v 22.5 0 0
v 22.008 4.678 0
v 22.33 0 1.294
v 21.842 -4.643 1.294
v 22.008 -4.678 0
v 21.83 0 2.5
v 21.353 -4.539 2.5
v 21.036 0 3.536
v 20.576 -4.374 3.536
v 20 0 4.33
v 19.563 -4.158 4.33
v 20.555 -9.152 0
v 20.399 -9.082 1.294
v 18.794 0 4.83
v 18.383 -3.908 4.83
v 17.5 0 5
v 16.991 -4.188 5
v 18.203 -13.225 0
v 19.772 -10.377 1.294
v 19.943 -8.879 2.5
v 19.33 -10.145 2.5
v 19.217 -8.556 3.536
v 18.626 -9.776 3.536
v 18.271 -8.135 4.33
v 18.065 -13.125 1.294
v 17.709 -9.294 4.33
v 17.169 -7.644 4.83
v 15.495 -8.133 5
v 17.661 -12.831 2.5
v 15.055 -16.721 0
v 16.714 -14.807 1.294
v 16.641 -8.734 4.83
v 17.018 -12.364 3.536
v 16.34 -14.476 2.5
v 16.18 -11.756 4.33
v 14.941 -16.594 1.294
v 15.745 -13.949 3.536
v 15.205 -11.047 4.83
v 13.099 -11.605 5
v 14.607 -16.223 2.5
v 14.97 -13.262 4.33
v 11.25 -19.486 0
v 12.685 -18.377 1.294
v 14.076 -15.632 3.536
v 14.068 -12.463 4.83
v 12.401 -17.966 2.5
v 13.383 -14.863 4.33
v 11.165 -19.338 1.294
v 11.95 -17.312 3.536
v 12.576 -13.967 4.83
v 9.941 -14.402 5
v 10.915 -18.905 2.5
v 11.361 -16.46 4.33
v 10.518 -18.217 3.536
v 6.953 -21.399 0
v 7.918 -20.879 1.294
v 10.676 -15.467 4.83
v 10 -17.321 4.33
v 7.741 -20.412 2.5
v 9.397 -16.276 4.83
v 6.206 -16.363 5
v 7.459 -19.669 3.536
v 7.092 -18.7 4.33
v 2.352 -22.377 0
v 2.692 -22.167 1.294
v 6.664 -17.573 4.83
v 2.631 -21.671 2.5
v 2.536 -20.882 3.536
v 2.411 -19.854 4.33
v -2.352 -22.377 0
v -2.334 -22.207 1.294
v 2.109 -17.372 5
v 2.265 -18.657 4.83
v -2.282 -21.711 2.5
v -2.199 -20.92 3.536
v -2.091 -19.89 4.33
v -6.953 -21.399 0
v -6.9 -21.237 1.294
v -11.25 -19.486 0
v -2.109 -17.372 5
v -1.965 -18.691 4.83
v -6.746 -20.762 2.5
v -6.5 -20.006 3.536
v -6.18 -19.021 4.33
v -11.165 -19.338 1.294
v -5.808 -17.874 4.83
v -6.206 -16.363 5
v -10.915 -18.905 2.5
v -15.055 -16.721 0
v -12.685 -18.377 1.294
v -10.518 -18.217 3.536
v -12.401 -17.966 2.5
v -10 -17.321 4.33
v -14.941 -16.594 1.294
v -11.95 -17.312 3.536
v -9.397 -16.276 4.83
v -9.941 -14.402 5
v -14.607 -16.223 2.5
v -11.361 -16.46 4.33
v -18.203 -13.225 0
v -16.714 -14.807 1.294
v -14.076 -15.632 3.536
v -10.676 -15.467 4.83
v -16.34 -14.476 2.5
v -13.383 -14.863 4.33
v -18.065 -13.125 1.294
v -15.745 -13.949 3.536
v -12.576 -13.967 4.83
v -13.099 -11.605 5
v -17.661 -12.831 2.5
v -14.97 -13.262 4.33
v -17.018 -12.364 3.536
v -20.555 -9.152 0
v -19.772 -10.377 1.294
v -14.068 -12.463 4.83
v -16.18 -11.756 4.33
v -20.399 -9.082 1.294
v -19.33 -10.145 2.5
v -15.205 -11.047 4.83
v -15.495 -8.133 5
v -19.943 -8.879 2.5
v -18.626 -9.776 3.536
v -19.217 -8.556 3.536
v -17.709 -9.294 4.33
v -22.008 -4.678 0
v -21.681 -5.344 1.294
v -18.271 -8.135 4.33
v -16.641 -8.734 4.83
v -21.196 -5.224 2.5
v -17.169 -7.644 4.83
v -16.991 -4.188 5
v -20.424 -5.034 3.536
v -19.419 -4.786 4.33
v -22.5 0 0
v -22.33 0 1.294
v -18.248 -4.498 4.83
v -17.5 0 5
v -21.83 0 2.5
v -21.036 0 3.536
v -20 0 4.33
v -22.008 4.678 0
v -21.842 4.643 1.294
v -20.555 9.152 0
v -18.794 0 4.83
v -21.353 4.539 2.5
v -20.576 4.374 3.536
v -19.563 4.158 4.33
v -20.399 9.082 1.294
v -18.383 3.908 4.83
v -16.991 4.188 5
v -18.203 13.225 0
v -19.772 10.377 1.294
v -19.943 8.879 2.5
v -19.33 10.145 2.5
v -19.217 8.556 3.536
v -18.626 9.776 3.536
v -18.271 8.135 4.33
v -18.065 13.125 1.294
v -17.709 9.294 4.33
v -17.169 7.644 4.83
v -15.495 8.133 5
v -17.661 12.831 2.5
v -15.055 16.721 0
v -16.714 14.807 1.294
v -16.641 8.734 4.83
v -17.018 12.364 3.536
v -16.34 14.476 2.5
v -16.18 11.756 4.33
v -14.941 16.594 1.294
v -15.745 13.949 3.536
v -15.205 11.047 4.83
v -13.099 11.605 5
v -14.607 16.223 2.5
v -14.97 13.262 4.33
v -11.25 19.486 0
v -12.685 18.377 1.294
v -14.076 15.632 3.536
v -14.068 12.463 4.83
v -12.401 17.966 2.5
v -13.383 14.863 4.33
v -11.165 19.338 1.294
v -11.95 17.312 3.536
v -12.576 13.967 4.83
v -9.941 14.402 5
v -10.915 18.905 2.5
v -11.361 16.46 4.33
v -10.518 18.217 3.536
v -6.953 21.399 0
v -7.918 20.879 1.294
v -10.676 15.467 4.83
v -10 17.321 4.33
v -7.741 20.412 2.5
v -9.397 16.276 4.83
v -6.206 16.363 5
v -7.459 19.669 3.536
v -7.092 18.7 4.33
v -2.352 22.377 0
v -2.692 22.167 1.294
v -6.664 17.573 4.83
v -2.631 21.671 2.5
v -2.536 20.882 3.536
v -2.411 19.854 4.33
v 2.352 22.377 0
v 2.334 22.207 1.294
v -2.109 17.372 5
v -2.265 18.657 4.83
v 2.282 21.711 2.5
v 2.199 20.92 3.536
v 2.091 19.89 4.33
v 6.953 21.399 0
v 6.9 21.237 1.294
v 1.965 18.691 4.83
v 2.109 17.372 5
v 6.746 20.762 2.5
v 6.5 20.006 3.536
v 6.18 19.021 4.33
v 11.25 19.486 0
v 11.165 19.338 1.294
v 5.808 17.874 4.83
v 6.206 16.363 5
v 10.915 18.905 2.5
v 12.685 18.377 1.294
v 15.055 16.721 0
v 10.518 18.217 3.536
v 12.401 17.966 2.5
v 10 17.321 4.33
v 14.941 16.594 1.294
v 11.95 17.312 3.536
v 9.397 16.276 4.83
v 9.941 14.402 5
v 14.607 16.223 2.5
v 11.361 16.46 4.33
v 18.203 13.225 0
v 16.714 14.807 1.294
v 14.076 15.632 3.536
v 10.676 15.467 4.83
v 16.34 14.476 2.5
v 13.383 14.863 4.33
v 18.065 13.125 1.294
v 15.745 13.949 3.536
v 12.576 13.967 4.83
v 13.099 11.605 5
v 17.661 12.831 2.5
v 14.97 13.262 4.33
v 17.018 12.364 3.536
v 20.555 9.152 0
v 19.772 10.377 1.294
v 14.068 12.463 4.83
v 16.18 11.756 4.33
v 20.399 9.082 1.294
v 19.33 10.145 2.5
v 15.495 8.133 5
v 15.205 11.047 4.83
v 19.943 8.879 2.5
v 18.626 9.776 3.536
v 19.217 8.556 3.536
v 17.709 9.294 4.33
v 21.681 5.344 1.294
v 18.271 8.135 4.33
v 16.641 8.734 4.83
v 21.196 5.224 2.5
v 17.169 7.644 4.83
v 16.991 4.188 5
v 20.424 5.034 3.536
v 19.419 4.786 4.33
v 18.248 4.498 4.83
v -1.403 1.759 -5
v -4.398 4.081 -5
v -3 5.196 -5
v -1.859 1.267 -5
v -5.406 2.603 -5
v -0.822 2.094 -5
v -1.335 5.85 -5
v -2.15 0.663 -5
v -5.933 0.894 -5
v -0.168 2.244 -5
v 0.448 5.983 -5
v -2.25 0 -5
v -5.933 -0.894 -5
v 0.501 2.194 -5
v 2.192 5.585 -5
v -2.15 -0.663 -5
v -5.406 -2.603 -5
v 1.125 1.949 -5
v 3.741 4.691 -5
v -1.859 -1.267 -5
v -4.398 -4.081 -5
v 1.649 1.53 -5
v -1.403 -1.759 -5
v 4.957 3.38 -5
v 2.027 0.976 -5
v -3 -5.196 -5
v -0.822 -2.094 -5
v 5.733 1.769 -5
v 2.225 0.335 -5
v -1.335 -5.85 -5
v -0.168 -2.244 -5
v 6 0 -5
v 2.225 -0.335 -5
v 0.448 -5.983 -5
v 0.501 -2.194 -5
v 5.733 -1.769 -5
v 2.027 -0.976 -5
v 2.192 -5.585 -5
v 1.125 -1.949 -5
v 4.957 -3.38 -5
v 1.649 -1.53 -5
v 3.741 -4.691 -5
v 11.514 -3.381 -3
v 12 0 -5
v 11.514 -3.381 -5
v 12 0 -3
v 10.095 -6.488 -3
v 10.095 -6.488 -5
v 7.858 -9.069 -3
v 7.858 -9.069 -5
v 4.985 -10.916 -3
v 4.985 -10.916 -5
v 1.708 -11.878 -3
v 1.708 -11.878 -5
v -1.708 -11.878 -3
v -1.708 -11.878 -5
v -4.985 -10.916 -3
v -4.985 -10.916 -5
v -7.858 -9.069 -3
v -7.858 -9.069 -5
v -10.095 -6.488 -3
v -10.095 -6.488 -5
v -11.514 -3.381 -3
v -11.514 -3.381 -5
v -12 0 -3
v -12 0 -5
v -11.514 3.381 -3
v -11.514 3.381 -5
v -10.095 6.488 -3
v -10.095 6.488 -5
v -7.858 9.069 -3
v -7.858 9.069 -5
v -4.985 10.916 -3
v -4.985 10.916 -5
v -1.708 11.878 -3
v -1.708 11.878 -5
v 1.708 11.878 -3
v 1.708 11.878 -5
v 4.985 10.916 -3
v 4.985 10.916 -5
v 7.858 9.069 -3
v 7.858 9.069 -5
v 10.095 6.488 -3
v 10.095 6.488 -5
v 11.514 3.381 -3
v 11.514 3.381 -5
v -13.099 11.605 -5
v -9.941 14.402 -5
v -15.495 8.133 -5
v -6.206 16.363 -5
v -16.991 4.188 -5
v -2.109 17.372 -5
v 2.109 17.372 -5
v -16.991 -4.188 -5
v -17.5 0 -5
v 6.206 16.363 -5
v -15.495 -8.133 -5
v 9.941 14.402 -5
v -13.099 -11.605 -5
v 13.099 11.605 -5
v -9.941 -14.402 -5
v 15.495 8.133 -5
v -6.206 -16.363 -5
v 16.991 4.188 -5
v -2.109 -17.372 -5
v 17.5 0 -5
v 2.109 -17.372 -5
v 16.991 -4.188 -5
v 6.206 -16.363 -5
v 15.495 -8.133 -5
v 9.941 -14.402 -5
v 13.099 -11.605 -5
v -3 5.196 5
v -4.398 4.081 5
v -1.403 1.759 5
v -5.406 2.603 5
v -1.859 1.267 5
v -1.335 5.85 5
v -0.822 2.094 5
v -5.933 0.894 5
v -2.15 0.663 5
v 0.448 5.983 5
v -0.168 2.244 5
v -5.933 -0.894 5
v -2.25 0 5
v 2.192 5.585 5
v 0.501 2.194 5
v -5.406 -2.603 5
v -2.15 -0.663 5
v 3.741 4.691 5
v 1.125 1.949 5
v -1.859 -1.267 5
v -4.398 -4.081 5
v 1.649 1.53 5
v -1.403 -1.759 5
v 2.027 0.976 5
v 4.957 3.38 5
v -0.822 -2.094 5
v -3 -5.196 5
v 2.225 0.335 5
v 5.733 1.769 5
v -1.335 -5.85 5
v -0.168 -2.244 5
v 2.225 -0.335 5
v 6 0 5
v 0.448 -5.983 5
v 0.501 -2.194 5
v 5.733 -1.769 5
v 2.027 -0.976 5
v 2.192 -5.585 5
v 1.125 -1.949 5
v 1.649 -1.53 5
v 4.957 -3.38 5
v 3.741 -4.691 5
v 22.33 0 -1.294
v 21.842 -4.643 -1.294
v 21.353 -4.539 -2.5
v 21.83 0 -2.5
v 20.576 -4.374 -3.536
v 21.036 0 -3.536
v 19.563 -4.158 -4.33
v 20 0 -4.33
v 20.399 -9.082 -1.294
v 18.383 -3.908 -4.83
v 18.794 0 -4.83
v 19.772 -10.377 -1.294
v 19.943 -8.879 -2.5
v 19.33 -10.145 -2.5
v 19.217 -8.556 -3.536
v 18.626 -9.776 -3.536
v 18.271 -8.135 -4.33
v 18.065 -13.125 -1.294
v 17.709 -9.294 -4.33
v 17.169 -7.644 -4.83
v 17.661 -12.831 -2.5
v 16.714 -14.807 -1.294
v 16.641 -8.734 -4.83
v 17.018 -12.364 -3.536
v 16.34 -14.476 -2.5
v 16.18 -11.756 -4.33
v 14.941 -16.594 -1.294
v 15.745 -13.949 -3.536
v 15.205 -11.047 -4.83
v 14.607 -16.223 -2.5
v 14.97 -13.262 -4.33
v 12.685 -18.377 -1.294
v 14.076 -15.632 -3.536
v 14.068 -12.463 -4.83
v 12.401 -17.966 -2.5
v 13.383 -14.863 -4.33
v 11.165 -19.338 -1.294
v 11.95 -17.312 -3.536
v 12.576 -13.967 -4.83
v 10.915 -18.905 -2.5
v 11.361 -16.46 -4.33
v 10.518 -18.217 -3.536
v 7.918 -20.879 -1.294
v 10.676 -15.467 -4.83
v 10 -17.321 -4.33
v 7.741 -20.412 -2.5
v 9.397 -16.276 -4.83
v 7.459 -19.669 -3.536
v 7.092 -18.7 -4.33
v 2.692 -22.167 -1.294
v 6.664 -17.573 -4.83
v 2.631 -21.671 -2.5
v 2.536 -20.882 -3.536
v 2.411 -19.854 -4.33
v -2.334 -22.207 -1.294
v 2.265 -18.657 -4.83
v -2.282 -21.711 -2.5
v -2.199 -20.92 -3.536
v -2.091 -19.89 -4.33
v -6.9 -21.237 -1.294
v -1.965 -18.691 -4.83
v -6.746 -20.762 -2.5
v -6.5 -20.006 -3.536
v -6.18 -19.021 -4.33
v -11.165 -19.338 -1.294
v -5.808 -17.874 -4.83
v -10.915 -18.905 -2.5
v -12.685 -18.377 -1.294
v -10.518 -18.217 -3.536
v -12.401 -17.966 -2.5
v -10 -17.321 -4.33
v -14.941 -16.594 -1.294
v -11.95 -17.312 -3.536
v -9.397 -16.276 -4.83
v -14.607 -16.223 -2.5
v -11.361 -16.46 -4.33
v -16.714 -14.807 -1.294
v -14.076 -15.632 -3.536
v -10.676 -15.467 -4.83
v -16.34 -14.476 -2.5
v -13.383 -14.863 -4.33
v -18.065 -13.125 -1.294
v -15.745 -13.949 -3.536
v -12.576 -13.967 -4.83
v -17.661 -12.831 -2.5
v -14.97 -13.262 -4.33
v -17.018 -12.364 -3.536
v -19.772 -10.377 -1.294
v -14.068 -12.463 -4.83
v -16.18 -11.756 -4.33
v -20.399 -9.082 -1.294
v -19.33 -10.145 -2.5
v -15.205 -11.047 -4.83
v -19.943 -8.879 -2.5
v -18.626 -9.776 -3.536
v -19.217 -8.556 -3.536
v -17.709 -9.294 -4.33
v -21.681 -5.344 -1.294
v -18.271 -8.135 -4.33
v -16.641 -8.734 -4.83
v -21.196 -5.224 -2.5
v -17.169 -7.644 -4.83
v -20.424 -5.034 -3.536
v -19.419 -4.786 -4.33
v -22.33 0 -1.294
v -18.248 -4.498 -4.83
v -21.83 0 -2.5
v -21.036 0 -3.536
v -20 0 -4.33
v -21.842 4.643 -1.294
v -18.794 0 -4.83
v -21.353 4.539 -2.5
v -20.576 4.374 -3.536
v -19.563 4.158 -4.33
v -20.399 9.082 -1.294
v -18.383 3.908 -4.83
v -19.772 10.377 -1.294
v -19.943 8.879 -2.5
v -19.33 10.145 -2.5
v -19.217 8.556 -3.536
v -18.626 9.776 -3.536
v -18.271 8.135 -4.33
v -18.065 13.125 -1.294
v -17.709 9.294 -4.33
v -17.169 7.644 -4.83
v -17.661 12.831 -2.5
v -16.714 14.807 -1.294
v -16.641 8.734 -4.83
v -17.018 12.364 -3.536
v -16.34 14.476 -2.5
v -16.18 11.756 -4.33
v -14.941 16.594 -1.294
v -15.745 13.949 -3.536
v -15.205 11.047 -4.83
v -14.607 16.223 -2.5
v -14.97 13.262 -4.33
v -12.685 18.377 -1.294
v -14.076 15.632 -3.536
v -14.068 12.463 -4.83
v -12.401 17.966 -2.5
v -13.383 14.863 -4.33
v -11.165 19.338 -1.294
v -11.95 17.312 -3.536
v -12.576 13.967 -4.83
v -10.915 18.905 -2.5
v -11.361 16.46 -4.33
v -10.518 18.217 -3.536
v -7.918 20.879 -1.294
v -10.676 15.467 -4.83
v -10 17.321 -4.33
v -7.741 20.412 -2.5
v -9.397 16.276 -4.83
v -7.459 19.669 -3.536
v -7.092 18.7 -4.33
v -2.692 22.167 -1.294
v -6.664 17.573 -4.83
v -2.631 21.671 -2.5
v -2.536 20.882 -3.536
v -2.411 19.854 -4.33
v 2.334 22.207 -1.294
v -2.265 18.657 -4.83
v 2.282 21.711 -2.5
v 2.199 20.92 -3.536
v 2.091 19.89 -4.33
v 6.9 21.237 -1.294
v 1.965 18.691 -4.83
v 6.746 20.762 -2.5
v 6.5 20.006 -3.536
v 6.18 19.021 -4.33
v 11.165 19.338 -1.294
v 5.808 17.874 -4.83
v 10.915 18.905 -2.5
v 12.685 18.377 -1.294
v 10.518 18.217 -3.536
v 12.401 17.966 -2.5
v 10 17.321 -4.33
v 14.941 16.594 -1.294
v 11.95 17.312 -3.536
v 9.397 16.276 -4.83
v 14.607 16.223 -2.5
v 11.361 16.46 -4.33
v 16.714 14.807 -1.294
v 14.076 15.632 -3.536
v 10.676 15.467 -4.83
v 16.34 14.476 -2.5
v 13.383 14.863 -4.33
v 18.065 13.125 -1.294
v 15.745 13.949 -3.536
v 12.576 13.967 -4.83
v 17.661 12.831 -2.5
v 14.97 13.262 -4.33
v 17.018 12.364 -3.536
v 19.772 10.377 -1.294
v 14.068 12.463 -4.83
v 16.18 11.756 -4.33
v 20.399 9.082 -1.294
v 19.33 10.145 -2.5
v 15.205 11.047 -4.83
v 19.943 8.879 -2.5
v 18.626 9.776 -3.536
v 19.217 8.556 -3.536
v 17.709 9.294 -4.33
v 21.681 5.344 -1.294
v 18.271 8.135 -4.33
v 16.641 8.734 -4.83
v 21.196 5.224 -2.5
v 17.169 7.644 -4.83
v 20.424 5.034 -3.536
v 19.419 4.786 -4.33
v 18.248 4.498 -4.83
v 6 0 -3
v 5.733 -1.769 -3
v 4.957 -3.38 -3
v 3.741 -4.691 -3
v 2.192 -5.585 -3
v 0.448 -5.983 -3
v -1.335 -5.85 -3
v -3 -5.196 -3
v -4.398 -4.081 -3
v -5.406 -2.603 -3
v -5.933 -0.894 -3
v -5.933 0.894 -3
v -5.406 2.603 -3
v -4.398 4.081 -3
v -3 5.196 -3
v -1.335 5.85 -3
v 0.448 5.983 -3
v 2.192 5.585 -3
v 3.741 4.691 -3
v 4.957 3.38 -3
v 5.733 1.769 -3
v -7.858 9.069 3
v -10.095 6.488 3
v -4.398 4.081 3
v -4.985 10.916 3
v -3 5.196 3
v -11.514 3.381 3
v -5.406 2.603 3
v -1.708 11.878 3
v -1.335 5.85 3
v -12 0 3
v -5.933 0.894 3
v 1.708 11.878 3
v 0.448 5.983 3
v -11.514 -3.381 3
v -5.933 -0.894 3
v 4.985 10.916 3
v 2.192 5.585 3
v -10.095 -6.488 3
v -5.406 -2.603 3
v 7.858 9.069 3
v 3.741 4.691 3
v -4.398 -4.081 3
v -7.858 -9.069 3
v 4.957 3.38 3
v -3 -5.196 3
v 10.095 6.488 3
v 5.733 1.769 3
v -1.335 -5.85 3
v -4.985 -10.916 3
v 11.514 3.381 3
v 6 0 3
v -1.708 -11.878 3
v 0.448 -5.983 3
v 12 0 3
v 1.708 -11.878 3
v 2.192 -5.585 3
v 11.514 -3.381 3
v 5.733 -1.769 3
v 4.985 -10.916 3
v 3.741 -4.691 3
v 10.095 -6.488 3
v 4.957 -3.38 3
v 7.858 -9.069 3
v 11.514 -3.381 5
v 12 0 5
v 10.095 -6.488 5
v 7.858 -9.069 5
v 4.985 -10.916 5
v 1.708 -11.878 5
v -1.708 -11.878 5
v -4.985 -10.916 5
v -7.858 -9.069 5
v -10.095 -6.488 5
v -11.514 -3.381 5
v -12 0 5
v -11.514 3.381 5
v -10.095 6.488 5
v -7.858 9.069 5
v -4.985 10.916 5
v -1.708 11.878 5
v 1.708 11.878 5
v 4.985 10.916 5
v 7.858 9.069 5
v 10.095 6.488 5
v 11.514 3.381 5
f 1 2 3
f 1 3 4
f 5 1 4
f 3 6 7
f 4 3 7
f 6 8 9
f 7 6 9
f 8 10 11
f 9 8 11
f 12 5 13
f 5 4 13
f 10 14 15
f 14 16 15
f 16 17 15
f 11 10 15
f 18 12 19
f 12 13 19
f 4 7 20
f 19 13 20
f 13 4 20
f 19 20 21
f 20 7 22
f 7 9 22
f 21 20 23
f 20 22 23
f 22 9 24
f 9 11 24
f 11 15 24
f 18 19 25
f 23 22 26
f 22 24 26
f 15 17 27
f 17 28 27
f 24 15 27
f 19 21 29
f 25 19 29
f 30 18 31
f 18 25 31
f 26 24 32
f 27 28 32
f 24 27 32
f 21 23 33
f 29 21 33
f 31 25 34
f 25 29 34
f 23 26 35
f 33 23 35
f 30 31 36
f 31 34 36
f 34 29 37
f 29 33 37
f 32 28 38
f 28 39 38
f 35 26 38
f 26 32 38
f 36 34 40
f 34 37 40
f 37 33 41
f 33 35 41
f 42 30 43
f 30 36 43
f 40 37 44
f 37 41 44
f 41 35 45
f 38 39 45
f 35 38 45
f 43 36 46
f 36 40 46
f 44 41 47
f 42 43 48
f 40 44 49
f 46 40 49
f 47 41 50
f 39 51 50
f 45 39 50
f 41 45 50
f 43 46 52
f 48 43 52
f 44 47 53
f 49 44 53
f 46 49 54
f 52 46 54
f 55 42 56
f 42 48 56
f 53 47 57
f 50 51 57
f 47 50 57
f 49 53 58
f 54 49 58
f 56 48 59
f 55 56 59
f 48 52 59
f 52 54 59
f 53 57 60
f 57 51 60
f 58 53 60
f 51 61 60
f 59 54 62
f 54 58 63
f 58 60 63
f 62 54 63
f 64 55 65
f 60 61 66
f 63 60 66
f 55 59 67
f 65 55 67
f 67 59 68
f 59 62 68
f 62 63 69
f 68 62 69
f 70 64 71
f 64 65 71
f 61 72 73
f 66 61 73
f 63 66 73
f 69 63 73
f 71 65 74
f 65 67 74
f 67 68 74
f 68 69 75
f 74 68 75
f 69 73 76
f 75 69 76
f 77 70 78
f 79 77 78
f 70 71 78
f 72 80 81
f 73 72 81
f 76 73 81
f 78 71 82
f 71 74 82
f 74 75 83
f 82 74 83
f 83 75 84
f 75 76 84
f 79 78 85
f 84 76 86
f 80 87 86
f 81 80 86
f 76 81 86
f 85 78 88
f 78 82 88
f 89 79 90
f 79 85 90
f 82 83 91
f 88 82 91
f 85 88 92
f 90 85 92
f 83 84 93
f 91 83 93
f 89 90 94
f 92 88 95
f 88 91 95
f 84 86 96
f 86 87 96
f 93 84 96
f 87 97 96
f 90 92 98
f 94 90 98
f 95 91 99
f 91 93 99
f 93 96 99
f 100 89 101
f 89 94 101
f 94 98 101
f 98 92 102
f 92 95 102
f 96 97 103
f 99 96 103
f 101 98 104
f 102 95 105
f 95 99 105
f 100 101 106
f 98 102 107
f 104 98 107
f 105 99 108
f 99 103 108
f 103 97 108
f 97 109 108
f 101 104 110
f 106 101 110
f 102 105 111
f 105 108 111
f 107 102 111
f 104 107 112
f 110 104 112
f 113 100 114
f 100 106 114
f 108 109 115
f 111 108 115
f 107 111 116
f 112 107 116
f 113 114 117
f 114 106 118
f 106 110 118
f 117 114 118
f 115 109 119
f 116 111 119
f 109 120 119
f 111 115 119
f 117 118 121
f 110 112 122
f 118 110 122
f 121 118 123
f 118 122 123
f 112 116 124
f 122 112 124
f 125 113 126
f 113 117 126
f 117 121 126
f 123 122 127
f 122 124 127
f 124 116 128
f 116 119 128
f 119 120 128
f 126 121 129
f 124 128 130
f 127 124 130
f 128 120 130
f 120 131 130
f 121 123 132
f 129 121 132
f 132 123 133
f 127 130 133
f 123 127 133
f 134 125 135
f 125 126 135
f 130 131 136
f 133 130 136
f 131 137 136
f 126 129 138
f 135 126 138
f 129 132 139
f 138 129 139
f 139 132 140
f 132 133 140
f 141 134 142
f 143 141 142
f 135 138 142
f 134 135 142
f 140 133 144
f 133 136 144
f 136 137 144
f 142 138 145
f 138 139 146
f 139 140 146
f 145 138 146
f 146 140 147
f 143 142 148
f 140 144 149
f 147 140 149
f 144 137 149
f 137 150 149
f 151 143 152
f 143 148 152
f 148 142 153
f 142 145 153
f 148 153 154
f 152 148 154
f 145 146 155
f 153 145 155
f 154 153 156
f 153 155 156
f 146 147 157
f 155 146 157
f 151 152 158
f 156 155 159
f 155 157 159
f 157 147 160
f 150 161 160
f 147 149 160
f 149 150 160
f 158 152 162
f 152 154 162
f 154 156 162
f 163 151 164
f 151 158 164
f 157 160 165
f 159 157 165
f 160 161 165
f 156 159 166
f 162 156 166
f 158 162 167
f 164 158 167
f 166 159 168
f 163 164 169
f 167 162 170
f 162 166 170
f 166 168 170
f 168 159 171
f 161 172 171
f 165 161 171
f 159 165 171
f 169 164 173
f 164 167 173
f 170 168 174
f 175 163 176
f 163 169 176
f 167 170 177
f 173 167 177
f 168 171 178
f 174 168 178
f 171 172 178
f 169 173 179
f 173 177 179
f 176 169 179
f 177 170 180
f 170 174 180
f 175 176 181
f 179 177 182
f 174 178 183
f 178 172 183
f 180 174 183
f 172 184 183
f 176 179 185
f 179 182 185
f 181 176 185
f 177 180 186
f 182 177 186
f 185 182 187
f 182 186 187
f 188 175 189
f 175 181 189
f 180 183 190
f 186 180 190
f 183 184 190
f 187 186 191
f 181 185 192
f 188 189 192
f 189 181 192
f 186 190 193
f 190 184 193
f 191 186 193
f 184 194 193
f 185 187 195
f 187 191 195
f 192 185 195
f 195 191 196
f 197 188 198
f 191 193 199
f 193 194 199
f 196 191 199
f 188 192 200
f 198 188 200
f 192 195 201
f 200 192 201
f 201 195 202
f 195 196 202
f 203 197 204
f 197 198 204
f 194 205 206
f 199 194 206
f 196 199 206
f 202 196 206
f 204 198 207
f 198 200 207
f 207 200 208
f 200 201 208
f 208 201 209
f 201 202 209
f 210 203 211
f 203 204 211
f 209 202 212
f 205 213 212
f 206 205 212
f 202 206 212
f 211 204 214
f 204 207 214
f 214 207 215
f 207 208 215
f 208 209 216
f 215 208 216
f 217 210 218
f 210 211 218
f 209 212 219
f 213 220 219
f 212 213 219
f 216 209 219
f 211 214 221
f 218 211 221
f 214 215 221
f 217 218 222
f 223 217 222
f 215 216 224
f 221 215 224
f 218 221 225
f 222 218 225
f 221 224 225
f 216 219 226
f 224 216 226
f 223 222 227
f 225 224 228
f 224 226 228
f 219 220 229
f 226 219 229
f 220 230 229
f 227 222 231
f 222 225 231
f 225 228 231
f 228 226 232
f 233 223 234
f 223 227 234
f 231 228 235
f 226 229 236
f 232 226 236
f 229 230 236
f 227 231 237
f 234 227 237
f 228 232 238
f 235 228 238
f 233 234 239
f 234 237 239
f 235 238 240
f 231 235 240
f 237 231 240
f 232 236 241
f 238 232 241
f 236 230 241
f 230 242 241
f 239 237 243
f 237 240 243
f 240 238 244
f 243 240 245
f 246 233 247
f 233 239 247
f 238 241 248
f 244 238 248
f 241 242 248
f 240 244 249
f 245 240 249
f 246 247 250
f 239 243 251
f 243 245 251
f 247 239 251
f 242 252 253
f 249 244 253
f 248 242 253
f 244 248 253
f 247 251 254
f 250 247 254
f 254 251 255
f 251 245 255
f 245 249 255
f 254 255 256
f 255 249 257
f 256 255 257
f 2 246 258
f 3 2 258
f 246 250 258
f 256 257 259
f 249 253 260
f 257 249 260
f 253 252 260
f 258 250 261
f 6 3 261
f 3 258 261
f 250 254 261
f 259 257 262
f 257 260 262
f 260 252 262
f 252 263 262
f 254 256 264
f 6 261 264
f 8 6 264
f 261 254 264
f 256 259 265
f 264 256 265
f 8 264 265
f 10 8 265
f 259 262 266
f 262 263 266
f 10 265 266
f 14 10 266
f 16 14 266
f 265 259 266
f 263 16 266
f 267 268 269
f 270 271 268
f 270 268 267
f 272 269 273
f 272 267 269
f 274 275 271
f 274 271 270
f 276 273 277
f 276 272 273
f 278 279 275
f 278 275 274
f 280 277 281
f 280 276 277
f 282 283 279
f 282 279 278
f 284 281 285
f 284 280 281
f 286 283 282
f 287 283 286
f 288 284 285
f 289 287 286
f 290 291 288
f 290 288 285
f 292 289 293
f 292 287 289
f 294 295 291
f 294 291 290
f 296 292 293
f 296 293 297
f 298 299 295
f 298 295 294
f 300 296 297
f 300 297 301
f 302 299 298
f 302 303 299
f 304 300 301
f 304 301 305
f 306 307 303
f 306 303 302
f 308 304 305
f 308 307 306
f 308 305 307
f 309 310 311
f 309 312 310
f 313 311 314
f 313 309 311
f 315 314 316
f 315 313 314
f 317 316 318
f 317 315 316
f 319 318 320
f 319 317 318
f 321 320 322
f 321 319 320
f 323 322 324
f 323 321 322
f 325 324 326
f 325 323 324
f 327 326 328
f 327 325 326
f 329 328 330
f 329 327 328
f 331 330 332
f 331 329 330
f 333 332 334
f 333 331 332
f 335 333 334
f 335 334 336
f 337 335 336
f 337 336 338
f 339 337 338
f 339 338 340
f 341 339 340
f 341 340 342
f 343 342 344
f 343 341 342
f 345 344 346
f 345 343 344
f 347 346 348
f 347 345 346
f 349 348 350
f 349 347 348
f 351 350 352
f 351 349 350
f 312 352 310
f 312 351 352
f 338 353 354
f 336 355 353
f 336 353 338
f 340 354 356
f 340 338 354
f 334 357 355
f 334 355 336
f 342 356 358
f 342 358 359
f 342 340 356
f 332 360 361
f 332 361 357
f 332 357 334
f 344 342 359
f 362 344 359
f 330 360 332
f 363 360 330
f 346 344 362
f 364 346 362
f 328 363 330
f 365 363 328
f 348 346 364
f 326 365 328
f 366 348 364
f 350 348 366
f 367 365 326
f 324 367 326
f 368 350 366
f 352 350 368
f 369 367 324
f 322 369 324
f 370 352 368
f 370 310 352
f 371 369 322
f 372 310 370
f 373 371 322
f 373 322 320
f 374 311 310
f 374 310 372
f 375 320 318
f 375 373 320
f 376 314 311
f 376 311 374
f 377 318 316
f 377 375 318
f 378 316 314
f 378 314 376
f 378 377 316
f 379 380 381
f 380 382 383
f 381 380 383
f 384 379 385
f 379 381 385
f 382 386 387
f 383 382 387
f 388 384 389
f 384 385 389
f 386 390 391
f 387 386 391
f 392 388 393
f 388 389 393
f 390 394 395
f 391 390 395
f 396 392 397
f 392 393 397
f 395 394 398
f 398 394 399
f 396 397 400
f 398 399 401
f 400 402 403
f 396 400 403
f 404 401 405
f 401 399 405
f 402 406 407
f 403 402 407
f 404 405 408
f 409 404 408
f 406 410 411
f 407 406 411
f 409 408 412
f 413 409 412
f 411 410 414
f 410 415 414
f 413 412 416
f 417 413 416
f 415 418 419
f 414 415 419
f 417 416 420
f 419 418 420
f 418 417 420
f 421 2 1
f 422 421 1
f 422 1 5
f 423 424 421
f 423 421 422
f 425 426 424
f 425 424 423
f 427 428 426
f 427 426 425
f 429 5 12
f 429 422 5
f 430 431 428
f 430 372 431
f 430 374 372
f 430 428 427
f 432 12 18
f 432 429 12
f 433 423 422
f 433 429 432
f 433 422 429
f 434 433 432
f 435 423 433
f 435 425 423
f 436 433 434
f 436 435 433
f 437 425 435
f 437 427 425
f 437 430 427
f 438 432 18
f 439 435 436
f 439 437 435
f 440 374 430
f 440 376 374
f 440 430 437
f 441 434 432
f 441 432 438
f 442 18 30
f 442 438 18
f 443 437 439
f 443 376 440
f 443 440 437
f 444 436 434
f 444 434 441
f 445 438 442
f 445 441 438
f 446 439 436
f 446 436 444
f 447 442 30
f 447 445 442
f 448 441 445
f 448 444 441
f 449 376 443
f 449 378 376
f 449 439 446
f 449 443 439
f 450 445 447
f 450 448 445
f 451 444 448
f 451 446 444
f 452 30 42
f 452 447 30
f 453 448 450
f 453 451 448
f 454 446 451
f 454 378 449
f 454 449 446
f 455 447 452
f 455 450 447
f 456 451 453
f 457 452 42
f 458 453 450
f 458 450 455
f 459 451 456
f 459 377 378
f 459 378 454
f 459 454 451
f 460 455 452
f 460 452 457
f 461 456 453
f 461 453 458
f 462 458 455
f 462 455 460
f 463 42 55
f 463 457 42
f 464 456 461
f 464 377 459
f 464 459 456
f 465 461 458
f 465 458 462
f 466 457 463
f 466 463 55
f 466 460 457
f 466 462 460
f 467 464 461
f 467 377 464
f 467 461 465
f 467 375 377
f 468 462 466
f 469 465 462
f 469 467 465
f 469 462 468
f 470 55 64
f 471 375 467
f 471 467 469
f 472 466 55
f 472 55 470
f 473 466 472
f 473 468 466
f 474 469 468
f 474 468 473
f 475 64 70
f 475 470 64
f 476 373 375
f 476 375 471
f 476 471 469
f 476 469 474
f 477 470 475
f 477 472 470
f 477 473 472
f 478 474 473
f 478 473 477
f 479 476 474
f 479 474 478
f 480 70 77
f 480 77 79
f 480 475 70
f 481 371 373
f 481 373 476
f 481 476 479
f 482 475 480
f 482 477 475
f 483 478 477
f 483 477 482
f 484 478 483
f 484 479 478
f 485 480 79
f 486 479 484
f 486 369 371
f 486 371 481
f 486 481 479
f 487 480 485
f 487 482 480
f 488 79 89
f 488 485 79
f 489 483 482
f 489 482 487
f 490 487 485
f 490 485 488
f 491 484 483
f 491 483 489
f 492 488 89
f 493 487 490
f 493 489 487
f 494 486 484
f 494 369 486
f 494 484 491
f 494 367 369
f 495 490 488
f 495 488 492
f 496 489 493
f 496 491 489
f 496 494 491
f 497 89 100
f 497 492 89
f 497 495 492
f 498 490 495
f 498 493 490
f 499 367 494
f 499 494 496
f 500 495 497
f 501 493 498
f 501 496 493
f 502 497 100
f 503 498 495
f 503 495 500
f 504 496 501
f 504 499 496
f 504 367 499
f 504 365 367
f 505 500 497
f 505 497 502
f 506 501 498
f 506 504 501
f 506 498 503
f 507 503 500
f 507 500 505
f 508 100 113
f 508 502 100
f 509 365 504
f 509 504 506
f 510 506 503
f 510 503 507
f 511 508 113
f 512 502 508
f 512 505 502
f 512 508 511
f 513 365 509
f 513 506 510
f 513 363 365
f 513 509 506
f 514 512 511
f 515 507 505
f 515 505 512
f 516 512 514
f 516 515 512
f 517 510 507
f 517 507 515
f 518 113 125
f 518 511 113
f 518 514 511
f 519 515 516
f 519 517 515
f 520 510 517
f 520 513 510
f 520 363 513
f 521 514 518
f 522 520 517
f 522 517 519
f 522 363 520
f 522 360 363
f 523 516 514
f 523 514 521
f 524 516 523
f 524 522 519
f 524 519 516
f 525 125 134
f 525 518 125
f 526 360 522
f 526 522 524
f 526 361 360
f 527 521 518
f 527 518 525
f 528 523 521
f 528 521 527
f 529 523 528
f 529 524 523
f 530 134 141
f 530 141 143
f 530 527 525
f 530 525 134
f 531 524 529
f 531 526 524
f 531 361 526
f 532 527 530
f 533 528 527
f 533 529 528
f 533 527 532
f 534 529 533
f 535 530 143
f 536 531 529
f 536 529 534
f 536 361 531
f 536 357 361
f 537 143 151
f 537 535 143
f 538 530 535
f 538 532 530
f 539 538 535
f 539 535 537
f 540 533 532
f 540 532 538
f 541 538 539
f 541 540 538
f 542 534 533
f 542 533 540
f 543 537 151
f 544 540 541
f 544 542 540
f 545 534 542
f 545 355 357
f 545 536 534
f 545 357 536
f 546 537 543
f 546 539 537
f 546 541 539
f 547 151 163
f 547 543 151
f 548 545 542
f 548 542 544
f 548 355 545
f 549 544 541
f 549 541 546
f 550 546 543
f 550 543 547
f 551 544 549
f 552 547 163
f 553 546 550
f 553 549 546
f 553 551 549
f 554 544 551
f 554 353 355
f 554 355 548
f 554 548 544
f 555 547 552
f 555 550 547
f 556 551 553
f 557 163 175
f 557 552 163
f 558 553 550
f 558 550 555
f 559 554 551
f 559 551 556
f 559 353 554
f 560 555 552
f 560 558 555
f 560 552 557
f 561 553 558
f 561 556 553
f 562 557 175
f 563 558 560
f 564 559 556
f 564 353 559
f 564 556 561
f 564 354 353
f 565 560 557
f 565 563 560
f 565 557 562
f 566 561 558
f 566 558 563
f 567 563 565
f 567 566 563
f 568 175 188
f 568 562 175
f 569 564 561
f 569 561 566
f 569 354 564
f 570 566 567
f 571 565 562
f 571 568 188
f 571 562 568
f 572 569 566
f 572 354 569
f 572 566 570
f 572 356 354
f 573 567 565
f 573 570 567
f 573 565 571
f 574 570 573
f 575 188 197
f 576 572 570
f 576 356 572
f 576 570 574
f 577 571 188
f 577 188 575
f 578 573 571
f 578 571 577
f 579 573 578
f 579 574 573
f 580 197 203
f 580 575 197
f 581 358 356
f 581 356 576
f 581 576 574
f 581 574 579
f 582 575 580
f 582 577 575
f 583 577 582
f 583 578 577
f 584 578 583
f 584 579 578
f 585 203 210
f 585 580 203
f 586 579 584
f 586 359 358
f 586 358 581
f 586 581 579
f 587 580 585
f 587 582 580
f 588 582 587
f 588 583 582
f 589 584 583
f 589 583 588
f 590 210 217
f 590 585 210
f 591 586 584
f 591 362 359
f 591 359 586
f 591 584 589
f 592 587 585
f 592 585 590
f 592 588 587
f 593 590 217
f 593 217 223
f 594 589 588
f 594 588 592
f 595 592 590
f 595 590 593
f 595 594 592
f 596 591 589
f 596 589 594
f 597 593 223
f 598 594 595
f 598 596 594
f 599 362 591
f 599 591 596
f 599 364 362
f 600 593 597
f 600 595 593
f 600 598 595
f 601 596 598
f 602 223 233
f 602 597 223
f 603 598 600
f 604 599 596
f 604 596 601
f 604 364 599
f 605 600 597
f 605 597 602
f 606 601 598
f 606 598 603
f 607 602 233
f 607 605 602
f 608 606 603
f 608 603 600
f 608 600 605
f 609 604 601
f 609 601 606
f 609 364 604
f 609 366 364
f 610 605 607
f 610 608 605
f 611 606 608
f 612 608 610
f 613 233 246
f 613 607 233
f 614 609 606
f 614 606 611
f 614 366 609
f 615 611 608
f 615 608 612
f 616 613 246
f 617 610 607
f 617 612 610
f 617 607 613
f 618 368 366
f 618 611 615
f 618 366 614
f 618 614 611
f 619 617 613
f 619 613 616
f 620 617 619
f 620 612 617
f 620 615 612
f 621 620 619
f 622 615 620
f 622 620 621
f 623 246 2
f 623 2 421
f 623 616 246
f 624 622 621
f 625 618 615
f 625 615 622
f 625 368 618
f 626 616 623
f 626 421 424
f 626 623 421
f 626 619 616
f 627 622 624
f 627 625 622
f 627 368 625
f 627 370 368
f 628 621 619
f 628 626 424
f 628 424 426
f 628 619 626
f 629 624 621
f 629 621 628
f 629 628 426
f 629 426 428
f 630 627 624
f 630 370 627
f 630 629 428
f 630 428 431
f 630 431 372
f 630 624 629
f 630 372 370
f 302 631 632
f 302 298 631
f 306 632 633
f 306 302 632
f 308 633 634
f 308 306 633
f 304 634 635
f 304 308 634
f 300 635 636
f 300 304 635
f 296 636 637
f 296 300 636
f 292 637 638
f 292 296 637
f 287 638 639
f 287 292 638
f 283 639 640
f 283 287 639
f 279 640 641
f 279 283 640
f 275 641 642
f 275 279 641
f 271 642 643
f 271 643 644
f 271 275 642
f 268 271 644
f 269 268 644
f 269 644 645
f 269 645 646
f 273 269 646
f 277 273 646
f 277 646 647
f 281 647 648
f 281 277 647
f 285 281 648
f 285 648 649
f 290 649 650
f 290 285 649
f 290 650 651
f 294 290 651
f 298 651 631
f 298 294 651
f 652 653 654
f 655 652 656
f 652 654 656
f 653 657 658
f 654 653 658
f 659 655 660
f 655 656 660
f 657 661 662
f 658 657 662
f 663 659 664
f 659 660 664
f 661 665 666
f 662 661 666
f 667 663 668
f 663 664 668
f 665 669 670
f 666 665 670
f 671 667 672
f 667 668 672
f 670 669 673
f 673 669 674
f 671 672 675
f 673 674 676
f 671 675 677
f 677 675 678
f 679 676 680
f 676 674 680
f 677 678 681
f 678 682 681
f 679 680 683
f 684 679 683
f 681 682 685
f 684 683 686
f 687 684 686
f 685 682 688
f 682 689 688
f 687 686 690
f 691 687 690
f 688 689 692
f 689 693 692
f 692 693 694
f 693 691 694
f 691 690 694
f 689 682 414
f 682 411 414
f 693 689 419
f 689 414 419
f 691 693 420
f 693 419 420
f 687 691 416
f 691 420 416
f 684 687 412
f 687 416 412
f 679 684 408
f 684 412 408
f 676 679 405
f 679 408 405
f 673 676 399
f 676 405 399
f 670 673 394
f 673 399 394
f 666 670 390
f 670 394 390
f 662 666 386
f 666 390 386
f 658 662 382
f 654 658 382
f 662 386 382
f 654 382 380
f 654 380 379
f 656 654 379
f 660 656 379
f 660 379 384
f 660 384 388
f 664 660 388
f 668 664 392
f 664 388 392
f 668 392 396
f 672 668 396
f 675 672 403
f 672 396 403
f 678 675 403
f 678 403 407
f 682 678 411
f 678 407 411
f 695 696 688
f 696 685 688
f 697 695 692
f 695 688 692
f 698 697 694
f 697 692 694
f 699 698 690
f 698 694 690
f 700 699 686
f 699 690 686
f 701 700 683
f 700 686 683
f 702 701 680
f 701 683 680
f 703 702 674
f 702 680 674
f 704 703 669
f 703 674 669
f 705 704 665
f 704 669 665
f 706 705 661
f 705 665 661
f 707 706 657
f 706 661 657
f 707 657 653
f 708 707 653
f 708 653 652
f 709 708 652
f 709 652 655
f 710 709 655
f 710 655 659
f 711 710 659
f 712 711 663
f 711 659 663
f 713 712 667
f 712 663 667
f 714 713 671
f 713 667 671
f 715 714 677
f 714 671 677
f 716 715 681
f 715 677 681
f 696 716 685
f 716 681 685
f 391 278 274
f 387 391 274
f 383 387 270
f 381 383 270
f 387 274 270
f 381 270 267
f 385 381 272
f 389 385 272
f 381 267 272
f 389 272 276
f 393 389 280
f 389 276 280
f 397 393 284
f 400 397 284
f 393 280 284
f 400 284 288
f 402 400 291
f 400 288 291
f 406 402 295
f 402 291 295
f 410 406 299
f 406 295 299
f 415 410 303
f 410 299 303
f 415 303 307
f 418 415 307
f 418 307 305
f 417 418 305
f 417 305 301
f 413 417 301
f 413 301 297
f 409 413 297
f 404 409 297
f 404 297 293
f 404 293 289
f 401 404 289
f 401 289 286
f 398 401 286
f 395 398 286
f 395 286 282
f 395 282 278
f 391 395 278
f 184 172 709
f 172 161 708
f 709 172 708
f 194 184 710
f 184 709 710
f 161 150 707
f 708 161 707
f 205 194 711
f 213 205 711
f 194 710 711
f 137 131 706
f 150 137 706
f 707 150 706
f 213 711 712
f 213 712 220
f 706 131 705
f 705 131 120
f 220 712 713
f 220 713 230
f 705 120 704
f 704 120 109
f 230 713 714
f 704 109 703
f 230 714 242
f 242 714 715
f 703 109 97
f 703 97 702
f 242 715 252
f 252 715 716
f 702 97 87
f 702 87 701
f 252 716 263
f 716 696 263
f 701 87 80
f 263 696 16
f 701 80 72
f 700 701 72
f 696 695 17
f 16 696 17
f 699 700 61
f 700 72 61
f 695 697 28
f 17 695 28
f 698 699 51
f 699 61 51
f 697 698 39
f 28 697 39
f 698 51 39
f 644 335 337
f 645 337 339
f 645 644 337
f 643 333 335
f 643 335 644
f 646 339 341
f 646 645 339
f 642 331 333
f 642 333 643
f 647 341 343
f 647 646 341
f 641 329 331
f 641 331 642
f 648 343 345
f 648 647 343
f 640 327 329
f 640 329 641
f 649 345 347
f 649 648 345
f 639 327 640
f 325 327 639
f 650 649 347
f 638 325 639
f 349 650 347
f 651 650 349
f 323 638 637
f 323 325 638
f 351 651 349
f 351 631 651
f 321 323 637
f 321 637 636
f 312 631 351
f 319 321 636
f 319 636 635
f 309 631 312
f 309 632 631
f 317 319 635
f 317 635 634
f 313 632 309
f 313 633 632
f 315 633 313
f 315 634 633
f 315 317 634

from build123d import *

# Parameters (mm, degrees)
SKETCH3_R          = 2.25
CUT_EXTRUDE2_DEPTH = 34.35416016


with BuildPart() as part:
    # Sketch1 → Revolve1 (revolve)
    with BuildSketch(Plane(origin=(0, 0, 0), x_dir=(0, 0, -1), z_dir=(1, 0, 0)), mode=Mode.PRIVATE) as revolve1_sk:
        with BuildLine():
            Line((0, 0), (0, -22.5))
            ThreePointArc((0, -22.5), (-3.535533906, -21.035533906), (-5, -17.5))
            Line((-5, -17.5), (-5, -12))
            Line((-5, -12), (-3, -12))
            Line((-3, -12), (-3, -6))
            Line((-3, -6), (-5, -6))
            Line((-5, -6), (-5, 0))
            Line((-5, 0), (0, 0))
        make_face()
    revolve1 = revolve(revolve1_sk.sketch.rotate(Axis((0, 0, 5), (0, 0, -1)), 270), axis=Axis((0, 0, 5), (0, 0, -1)))

    # Mirror1: Revolve1 across plane
    add(revolve1.mirror(Plane.XY))

    # Sketch3 → Cut-Extrude2 (cut, through all)
    with BuildSketch(Plane(origin=(0, 0, -5), x_dir=(-1, 0, 0), z_dir=(0, 0, -1))):
        Circle(SKETCH3_R)
    extrude(amount=-CUT_EXTRUDE2_DEPTH, mode=Mode.SUBTRACT)


solid = part.part
